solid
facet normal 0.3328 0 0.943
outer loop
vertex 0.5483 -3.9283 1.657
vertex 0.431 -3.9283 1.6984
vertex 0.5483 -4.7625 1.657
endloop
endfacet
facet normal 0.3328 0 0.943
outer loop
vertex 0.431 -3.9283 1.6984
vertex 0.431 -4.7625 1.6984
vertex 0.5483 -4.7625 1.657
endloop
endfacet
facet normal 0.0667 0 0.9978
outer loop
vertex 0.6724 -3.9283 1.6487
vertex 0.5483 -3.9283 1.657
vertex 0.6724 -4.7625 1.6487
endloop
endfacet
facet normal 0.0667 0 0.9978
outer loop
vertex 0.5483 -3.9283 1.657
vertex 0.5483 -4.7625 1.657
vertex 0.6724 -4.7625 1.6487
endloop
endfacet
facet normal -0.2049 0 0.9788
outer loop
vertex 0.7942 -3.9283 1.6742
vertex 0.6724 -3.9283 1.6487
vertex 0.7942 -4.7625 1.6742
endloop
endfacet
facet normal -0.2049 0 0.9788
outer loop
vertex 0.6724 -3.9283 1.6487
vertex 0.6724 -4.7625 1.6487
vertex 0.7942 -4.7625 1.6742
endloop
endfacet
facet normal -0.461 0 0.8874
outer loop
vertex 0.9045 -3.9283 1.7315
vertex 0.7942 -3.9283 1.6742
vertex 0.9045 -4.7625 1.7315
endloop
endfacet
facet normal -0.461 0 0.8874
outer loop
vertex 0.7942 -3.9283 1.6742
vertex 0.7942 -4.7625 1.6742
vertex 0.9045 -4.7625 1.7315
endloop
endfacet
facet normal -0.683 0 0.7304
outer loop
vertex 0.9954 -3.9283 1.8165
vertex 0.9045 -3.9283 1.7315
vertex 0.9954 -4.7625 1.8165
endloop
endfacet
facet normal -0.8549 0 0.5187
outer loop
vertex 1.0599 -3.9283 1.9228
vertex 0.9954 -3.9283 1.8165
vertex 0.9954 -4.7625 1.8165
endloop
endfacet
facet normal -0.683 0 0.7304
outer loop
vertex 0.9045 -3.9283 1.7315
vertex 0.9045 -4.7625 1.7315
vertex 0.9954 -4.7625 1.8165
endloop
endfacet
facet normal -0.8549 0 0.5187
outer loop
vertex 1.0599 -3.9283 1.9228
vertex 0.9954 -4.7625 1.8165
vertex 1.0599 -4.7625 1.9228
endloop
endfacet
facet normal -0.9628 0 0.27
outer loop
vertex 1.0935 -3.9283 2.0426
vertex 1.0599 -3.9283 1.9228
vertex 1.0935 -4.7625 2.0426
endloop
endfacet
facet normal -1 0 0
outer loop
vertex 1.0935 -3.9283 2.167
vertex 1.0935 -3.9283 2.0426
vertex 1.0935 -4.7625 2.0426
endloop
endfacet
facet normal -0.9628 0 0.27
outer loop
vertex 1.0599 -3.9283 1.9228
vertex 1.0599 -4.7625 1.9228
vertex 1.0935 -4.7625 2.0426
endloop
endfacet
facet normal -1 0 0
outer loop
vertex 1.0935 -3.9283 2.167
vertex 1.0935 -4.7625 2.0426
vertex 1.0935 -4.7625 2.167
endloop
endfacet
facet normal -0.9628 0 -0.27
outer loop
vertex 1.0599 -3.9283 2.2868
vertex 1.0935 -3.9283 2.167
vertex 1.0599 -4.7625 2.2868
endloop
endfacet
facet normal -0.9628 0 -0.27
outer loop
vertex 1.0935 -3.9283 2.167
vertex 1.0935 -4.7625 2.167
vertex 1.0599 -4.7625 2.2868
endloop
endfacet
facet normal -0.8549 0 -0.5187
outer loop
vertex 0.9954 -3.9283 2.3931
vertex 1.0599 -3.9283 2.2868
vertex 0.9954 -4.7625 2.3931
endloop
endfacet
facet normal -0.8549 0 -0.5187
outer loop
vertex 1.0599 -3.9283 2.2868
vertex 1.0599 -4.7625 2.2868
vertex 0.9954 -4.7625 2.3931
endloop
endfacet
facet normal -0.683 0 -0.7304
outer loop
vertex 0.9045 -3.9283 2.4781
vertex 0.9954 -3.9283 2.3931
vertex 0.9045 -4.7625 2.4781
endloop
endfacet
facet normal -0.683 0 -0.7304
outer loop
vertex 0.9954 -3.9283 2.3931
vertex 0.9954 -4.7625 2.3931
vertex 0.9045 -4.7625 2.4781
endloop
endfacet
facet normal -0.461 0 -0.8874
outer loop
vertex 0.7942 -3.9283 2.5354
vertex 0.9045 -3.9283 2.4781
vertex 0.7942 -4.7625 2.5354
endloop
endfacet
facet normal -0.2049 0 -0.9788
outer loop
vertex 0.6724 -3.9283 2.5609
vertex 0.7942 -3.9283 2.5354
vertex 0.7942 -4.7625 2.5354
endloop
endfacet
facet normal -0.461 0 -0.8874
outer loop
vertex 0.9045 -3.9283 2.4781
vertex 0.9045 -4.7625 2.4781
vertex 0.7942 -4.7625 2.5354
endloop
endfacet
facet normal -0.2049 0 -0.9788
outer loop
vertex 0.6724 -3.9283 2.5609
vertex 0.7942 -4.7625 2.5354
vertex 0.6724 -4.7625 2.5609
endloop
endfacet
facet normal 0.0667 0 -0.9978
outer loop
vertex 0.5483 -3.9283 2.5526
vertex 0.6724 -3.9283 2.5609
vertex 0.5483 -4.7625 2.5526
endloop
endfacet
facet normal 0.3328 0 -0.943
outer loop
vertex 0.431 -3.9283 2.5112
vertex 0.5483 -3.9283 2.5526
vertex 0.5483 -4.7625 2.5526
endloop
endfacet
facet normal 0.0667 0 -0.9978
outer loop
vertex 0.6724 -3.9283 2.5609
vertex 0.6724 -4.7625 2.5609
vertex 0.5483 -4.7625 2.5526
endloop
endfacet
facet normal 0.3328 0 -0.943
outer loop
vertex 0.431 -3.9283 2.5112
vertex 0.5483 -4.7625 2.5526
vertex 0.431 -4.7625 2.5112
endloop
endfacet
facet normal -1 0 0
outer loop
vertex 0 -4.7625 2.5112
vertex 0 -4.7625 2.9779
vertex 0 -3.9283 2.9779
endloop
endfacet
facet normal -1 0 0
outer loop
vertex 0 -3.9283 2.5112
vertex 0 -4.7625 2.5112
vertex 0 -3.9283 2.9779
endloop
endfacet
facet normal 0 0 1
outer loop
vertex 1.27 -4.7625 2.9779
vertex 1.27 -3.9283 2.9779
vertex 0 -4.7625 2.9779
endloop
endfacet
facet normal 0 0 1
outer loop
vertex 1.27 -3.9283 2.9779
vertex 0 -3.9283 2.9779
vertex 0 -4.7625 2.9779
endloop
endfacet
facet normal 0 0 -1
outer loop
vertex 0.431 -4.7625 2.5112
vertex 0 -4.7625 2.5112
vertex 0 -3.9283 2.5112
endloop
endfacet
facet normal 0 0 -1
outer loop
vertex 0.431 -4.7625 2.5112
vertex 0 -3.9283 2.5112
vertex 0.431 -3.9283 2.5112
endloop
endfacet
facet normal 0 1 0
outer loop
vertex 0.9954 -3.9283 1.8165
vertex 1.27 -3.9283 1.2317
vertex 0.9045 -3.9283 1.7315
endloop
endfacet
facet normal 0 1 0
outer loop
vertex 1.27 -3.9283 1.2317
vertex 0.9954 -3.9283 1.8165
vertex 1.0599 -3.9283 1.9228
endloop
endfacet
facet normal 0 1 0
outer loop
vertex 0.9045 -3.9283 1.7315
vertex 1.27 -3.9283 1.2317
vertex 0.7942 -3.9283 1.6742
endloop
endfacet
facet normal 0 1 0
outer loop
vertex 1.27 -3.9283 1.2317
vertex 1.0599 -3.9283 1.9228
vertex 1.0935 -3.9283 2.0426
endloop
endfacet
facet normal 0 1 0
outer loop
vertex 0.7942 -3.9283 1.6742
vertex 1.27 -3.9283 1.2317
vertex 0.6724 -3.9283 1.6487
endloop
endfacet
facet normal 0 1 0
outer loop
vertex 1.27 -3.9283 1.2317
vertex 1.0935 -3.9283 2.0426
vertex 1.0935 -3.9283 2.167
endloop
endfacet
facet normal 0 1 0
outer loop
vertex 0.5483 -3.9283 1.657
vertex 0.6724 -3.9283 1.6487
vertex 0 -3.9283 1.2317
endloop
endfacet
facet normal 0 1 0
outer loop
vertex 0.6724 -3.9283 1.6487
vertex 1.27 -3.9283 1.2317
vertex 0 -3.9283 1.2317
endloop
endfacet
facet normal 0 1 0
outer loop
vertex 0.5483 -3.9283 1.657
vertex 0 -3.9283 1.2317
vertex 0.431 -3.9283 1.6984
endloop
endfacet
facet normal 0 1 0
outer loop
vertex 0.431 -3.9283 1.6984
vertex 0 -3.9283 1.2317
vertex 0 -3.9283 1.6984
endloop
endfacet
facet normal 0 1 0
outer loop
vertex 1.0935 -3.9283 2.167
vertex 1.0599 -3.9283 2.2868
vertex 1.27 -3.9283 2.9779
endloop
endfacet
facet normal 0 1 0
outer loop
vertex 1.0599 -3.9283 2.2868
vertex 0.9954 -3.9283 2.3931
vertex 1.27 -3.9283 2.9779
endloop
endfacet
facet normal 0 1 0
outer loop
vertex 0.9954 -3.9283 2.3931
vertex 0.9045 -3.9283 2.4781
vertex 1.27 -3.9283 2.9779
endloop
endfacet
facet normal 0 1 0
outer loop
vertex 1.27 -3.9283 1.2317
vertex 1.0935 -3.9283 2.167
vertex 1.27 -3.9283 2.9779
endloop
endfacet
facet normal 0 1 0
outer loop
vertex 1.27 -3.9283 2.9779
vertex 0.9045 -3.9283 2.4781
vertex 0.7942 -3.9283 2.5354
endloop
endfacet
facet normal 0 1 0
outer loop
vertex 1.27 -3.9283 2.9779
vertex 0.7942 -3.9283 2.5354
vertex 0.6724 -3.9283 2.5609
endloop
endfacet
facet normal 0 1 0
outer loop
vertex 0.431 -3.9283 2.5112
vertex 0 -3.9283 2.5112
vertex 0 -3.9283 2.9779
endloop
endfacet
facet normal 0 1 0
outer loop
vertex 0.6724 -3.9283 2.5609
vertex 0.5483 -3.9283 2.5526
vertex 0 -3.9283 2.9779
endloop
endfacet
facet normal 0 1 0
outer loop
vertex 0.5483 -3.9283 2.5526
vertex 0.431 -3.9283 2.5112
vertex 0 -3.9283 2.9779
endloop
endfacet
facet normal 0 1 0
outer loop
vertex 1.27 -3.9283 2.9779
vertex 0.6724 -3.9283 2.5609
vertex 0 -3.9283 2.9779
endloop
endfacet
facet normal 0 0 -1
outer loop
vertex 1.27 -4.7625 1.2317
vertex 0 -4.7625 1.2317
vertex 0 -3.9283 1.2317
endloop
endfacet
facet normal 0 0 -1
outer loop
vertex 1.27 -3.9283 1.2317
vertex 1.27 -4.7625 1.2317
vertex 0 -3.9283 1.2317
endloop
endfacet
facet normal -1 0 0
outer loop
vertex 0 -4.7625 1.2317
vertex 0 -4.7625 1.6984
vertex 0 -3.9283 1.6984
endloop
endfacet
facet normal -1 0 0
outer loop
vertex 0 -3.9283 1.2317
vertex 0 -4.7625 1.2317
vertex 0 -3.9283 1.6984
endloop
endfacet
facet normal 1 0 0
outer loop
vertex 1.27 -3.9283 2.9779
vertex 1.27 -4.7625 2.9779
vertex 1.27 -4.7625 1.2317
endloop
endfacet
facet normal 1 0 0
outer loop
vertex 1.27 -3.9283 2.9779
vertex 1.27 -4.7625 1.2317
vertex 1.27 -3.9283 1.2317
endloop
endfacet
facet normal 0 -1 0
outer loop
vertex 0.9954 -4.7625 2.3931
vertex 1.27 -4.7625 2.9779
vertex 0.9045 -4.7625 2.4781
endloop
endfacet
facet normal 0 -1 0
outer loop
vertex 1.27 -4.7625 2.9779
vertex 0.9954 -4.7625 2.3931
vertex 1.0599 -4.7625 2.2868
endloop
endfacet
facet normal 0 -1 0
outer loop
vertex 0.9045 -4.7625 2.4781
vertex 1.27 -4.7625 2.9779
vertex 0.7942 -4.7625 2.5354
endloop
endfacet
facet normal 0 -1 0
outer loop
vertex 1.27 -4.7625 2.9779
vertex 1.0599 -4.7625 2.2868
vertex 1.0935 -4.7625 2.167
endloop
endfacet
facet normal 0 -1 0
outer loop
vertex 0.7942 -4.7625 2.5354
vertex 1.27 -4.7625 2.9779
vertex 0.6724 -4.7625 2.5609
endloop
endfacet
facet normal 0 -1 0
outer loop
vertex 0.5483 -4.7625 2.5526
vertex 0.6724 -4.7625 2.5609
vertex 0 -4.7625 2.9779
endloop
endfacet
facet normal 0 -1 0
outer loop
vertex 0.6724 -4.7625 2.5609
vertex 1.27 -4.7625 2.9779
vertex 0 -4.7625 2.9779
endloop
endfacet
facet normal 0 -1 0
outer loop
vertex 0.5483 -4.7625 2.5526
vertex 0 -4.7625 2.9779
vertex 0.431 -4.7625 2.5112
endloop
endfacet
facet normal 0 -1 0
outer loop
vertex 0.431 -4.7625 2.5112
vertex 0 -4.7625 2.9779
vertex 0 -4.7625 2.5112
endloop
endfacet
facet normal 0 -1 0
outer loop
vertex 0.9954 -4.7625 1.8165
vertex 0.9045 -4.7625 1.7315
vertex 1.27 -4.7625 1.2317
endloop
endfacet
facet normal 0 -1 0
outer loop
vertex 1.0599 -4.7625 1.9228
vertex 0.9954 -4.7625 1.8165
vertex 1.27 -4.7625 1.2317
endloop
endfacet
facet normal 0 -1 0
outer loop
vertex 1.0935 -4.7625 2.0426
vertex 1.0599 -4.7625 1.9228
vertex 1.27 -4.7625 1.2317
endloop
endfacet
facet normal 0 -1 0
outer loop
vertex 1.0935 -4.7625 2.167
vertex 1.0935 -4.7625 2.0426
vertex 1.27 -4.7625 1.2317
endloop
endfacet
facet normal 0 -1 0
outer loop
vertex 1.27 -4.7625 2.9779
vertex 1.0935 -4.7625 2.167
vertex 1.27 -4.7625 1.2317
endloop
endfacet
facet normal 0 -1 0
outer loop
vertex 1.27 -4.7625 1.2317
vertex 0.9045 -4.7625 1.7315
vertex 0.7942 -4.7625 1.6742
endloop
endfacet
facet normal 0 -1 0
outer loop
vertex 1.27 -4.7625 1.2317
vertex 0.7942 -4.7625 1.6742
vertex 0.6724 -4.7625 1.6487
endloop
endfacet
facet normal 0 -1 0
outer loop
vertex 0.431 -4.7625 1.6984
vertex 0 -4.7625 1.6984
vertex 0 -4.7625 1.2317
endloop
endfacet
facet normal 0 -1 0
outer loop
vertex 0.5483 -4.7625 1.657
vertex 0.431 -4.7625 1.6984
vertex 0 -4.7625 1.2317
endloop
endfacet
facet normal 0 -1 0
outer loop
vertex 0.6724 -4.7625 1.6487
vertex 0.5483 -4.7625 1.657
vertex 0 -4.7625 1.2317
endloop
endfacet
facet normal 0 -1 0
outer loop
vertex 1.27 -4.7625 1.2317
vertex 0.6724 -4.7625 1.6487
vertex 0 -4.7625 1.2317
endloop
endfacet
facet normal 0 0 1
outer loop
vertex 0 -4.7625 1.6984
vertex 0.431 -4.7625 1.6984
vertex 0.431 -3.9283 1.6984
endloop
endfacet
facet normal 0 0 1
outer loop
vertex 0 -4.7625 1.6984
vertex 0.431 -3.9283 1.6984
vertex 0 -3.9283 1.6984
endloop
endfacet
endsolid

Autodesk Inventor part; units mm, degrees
ref_plane "YZ Plane" through (0, 0, 0) normal (1, 0, 0) x (0, 1, 0)
ref_plane "XZ Plane" through (0, 0, 0) normal (0, 1, 0) x (-1, 0, 0)
ref_plane "XY Plane" through (0, 0, 0) normal (0, 0, 1) x (1, 0, 0)
sketch "Sketch1" plane through (0, 0, 2.1048) normal (1, 0, 0) x (0, 1, 0)
  line L0 (-5.8691, -5.0828) -> (5.8691, -5.0828)
  line L1 (-3.9283, -0.8731) -> (-3.9283, 0.8731)
  line L2 (-3.9283, 0.8731) -> (-4.7625, 0.8731)
  line L3 (-4.7625, 0.8731) -> (-4.7625, -0.8731)
  line L4 (-4.7625, -0.8731) -> (-3.9283, -0.8731)
  line L5 (-3.9283, -0.8731) -> (-4.7625, 0.8731) construction
  line L6 (-3.9283, 0.8731) -> (-4.7625, -0.8731) construction
  point P0 (0, 0)
  point P1 (1.6165, -2.7999)
  point P2 (-4.3454, 0)
extrude "Extrusion1" add sketch "Sketch1" along normal blind 1.27
sketch "Sketch2" plane through (-4.7625, -4.7625, 0) normal (0, -1, 0) x (-1, 0, 0)
  arc A0 (-5.1935, -1.6984) -> (-5.1935, -2.5112) centre (-5.403, -2.1048) ccw
  line L0 (-6.0325, -1.2317) -> (-12.065, -1.2317)
  line L1 (-4.7625, -2.9779) -> (-6.0325, -2.9779) projected
  arc A1 (-5.1935, -1.6984) -> (-5.1935, -2.5112) centre (-5.403, -2.1048) ccw
  line L2 (-6.0325, -2.9779) -> (-6.0325, -1.2317) projected
  line L3 (-5.1935, -1.6984) -> (-4.7277, -1.6984)
  line L4 (-4.7277, -2.5112) -> (-5.1935, -2.5112)
  line L5 (-4.7277, -1.6984) -> (-4.7277, -2.5112)
  point P0 (-3.175, 0.8731)
  point P1 (0, 1.7462)
  point P2 (0, 0)
  point P3 (-6.0325, -2.1048)
  point P4 (-4.997, -2.5282)
  point P5 (-5.0204, -1.6646)
  dimension "d11" = 0.8731
  dimension "d13" = 0.4572
  dimension "d14" = 0.6295
  dimension "d15" = 0.8128
  dimension "d17" = 0.4658
  dimension "d18" = 0.4658
extrude "Extrusion2" cut sketch "Sketch2" against normal blind 1.27
equation "\"d18\" = d17"
properties part number "WireSlot"
